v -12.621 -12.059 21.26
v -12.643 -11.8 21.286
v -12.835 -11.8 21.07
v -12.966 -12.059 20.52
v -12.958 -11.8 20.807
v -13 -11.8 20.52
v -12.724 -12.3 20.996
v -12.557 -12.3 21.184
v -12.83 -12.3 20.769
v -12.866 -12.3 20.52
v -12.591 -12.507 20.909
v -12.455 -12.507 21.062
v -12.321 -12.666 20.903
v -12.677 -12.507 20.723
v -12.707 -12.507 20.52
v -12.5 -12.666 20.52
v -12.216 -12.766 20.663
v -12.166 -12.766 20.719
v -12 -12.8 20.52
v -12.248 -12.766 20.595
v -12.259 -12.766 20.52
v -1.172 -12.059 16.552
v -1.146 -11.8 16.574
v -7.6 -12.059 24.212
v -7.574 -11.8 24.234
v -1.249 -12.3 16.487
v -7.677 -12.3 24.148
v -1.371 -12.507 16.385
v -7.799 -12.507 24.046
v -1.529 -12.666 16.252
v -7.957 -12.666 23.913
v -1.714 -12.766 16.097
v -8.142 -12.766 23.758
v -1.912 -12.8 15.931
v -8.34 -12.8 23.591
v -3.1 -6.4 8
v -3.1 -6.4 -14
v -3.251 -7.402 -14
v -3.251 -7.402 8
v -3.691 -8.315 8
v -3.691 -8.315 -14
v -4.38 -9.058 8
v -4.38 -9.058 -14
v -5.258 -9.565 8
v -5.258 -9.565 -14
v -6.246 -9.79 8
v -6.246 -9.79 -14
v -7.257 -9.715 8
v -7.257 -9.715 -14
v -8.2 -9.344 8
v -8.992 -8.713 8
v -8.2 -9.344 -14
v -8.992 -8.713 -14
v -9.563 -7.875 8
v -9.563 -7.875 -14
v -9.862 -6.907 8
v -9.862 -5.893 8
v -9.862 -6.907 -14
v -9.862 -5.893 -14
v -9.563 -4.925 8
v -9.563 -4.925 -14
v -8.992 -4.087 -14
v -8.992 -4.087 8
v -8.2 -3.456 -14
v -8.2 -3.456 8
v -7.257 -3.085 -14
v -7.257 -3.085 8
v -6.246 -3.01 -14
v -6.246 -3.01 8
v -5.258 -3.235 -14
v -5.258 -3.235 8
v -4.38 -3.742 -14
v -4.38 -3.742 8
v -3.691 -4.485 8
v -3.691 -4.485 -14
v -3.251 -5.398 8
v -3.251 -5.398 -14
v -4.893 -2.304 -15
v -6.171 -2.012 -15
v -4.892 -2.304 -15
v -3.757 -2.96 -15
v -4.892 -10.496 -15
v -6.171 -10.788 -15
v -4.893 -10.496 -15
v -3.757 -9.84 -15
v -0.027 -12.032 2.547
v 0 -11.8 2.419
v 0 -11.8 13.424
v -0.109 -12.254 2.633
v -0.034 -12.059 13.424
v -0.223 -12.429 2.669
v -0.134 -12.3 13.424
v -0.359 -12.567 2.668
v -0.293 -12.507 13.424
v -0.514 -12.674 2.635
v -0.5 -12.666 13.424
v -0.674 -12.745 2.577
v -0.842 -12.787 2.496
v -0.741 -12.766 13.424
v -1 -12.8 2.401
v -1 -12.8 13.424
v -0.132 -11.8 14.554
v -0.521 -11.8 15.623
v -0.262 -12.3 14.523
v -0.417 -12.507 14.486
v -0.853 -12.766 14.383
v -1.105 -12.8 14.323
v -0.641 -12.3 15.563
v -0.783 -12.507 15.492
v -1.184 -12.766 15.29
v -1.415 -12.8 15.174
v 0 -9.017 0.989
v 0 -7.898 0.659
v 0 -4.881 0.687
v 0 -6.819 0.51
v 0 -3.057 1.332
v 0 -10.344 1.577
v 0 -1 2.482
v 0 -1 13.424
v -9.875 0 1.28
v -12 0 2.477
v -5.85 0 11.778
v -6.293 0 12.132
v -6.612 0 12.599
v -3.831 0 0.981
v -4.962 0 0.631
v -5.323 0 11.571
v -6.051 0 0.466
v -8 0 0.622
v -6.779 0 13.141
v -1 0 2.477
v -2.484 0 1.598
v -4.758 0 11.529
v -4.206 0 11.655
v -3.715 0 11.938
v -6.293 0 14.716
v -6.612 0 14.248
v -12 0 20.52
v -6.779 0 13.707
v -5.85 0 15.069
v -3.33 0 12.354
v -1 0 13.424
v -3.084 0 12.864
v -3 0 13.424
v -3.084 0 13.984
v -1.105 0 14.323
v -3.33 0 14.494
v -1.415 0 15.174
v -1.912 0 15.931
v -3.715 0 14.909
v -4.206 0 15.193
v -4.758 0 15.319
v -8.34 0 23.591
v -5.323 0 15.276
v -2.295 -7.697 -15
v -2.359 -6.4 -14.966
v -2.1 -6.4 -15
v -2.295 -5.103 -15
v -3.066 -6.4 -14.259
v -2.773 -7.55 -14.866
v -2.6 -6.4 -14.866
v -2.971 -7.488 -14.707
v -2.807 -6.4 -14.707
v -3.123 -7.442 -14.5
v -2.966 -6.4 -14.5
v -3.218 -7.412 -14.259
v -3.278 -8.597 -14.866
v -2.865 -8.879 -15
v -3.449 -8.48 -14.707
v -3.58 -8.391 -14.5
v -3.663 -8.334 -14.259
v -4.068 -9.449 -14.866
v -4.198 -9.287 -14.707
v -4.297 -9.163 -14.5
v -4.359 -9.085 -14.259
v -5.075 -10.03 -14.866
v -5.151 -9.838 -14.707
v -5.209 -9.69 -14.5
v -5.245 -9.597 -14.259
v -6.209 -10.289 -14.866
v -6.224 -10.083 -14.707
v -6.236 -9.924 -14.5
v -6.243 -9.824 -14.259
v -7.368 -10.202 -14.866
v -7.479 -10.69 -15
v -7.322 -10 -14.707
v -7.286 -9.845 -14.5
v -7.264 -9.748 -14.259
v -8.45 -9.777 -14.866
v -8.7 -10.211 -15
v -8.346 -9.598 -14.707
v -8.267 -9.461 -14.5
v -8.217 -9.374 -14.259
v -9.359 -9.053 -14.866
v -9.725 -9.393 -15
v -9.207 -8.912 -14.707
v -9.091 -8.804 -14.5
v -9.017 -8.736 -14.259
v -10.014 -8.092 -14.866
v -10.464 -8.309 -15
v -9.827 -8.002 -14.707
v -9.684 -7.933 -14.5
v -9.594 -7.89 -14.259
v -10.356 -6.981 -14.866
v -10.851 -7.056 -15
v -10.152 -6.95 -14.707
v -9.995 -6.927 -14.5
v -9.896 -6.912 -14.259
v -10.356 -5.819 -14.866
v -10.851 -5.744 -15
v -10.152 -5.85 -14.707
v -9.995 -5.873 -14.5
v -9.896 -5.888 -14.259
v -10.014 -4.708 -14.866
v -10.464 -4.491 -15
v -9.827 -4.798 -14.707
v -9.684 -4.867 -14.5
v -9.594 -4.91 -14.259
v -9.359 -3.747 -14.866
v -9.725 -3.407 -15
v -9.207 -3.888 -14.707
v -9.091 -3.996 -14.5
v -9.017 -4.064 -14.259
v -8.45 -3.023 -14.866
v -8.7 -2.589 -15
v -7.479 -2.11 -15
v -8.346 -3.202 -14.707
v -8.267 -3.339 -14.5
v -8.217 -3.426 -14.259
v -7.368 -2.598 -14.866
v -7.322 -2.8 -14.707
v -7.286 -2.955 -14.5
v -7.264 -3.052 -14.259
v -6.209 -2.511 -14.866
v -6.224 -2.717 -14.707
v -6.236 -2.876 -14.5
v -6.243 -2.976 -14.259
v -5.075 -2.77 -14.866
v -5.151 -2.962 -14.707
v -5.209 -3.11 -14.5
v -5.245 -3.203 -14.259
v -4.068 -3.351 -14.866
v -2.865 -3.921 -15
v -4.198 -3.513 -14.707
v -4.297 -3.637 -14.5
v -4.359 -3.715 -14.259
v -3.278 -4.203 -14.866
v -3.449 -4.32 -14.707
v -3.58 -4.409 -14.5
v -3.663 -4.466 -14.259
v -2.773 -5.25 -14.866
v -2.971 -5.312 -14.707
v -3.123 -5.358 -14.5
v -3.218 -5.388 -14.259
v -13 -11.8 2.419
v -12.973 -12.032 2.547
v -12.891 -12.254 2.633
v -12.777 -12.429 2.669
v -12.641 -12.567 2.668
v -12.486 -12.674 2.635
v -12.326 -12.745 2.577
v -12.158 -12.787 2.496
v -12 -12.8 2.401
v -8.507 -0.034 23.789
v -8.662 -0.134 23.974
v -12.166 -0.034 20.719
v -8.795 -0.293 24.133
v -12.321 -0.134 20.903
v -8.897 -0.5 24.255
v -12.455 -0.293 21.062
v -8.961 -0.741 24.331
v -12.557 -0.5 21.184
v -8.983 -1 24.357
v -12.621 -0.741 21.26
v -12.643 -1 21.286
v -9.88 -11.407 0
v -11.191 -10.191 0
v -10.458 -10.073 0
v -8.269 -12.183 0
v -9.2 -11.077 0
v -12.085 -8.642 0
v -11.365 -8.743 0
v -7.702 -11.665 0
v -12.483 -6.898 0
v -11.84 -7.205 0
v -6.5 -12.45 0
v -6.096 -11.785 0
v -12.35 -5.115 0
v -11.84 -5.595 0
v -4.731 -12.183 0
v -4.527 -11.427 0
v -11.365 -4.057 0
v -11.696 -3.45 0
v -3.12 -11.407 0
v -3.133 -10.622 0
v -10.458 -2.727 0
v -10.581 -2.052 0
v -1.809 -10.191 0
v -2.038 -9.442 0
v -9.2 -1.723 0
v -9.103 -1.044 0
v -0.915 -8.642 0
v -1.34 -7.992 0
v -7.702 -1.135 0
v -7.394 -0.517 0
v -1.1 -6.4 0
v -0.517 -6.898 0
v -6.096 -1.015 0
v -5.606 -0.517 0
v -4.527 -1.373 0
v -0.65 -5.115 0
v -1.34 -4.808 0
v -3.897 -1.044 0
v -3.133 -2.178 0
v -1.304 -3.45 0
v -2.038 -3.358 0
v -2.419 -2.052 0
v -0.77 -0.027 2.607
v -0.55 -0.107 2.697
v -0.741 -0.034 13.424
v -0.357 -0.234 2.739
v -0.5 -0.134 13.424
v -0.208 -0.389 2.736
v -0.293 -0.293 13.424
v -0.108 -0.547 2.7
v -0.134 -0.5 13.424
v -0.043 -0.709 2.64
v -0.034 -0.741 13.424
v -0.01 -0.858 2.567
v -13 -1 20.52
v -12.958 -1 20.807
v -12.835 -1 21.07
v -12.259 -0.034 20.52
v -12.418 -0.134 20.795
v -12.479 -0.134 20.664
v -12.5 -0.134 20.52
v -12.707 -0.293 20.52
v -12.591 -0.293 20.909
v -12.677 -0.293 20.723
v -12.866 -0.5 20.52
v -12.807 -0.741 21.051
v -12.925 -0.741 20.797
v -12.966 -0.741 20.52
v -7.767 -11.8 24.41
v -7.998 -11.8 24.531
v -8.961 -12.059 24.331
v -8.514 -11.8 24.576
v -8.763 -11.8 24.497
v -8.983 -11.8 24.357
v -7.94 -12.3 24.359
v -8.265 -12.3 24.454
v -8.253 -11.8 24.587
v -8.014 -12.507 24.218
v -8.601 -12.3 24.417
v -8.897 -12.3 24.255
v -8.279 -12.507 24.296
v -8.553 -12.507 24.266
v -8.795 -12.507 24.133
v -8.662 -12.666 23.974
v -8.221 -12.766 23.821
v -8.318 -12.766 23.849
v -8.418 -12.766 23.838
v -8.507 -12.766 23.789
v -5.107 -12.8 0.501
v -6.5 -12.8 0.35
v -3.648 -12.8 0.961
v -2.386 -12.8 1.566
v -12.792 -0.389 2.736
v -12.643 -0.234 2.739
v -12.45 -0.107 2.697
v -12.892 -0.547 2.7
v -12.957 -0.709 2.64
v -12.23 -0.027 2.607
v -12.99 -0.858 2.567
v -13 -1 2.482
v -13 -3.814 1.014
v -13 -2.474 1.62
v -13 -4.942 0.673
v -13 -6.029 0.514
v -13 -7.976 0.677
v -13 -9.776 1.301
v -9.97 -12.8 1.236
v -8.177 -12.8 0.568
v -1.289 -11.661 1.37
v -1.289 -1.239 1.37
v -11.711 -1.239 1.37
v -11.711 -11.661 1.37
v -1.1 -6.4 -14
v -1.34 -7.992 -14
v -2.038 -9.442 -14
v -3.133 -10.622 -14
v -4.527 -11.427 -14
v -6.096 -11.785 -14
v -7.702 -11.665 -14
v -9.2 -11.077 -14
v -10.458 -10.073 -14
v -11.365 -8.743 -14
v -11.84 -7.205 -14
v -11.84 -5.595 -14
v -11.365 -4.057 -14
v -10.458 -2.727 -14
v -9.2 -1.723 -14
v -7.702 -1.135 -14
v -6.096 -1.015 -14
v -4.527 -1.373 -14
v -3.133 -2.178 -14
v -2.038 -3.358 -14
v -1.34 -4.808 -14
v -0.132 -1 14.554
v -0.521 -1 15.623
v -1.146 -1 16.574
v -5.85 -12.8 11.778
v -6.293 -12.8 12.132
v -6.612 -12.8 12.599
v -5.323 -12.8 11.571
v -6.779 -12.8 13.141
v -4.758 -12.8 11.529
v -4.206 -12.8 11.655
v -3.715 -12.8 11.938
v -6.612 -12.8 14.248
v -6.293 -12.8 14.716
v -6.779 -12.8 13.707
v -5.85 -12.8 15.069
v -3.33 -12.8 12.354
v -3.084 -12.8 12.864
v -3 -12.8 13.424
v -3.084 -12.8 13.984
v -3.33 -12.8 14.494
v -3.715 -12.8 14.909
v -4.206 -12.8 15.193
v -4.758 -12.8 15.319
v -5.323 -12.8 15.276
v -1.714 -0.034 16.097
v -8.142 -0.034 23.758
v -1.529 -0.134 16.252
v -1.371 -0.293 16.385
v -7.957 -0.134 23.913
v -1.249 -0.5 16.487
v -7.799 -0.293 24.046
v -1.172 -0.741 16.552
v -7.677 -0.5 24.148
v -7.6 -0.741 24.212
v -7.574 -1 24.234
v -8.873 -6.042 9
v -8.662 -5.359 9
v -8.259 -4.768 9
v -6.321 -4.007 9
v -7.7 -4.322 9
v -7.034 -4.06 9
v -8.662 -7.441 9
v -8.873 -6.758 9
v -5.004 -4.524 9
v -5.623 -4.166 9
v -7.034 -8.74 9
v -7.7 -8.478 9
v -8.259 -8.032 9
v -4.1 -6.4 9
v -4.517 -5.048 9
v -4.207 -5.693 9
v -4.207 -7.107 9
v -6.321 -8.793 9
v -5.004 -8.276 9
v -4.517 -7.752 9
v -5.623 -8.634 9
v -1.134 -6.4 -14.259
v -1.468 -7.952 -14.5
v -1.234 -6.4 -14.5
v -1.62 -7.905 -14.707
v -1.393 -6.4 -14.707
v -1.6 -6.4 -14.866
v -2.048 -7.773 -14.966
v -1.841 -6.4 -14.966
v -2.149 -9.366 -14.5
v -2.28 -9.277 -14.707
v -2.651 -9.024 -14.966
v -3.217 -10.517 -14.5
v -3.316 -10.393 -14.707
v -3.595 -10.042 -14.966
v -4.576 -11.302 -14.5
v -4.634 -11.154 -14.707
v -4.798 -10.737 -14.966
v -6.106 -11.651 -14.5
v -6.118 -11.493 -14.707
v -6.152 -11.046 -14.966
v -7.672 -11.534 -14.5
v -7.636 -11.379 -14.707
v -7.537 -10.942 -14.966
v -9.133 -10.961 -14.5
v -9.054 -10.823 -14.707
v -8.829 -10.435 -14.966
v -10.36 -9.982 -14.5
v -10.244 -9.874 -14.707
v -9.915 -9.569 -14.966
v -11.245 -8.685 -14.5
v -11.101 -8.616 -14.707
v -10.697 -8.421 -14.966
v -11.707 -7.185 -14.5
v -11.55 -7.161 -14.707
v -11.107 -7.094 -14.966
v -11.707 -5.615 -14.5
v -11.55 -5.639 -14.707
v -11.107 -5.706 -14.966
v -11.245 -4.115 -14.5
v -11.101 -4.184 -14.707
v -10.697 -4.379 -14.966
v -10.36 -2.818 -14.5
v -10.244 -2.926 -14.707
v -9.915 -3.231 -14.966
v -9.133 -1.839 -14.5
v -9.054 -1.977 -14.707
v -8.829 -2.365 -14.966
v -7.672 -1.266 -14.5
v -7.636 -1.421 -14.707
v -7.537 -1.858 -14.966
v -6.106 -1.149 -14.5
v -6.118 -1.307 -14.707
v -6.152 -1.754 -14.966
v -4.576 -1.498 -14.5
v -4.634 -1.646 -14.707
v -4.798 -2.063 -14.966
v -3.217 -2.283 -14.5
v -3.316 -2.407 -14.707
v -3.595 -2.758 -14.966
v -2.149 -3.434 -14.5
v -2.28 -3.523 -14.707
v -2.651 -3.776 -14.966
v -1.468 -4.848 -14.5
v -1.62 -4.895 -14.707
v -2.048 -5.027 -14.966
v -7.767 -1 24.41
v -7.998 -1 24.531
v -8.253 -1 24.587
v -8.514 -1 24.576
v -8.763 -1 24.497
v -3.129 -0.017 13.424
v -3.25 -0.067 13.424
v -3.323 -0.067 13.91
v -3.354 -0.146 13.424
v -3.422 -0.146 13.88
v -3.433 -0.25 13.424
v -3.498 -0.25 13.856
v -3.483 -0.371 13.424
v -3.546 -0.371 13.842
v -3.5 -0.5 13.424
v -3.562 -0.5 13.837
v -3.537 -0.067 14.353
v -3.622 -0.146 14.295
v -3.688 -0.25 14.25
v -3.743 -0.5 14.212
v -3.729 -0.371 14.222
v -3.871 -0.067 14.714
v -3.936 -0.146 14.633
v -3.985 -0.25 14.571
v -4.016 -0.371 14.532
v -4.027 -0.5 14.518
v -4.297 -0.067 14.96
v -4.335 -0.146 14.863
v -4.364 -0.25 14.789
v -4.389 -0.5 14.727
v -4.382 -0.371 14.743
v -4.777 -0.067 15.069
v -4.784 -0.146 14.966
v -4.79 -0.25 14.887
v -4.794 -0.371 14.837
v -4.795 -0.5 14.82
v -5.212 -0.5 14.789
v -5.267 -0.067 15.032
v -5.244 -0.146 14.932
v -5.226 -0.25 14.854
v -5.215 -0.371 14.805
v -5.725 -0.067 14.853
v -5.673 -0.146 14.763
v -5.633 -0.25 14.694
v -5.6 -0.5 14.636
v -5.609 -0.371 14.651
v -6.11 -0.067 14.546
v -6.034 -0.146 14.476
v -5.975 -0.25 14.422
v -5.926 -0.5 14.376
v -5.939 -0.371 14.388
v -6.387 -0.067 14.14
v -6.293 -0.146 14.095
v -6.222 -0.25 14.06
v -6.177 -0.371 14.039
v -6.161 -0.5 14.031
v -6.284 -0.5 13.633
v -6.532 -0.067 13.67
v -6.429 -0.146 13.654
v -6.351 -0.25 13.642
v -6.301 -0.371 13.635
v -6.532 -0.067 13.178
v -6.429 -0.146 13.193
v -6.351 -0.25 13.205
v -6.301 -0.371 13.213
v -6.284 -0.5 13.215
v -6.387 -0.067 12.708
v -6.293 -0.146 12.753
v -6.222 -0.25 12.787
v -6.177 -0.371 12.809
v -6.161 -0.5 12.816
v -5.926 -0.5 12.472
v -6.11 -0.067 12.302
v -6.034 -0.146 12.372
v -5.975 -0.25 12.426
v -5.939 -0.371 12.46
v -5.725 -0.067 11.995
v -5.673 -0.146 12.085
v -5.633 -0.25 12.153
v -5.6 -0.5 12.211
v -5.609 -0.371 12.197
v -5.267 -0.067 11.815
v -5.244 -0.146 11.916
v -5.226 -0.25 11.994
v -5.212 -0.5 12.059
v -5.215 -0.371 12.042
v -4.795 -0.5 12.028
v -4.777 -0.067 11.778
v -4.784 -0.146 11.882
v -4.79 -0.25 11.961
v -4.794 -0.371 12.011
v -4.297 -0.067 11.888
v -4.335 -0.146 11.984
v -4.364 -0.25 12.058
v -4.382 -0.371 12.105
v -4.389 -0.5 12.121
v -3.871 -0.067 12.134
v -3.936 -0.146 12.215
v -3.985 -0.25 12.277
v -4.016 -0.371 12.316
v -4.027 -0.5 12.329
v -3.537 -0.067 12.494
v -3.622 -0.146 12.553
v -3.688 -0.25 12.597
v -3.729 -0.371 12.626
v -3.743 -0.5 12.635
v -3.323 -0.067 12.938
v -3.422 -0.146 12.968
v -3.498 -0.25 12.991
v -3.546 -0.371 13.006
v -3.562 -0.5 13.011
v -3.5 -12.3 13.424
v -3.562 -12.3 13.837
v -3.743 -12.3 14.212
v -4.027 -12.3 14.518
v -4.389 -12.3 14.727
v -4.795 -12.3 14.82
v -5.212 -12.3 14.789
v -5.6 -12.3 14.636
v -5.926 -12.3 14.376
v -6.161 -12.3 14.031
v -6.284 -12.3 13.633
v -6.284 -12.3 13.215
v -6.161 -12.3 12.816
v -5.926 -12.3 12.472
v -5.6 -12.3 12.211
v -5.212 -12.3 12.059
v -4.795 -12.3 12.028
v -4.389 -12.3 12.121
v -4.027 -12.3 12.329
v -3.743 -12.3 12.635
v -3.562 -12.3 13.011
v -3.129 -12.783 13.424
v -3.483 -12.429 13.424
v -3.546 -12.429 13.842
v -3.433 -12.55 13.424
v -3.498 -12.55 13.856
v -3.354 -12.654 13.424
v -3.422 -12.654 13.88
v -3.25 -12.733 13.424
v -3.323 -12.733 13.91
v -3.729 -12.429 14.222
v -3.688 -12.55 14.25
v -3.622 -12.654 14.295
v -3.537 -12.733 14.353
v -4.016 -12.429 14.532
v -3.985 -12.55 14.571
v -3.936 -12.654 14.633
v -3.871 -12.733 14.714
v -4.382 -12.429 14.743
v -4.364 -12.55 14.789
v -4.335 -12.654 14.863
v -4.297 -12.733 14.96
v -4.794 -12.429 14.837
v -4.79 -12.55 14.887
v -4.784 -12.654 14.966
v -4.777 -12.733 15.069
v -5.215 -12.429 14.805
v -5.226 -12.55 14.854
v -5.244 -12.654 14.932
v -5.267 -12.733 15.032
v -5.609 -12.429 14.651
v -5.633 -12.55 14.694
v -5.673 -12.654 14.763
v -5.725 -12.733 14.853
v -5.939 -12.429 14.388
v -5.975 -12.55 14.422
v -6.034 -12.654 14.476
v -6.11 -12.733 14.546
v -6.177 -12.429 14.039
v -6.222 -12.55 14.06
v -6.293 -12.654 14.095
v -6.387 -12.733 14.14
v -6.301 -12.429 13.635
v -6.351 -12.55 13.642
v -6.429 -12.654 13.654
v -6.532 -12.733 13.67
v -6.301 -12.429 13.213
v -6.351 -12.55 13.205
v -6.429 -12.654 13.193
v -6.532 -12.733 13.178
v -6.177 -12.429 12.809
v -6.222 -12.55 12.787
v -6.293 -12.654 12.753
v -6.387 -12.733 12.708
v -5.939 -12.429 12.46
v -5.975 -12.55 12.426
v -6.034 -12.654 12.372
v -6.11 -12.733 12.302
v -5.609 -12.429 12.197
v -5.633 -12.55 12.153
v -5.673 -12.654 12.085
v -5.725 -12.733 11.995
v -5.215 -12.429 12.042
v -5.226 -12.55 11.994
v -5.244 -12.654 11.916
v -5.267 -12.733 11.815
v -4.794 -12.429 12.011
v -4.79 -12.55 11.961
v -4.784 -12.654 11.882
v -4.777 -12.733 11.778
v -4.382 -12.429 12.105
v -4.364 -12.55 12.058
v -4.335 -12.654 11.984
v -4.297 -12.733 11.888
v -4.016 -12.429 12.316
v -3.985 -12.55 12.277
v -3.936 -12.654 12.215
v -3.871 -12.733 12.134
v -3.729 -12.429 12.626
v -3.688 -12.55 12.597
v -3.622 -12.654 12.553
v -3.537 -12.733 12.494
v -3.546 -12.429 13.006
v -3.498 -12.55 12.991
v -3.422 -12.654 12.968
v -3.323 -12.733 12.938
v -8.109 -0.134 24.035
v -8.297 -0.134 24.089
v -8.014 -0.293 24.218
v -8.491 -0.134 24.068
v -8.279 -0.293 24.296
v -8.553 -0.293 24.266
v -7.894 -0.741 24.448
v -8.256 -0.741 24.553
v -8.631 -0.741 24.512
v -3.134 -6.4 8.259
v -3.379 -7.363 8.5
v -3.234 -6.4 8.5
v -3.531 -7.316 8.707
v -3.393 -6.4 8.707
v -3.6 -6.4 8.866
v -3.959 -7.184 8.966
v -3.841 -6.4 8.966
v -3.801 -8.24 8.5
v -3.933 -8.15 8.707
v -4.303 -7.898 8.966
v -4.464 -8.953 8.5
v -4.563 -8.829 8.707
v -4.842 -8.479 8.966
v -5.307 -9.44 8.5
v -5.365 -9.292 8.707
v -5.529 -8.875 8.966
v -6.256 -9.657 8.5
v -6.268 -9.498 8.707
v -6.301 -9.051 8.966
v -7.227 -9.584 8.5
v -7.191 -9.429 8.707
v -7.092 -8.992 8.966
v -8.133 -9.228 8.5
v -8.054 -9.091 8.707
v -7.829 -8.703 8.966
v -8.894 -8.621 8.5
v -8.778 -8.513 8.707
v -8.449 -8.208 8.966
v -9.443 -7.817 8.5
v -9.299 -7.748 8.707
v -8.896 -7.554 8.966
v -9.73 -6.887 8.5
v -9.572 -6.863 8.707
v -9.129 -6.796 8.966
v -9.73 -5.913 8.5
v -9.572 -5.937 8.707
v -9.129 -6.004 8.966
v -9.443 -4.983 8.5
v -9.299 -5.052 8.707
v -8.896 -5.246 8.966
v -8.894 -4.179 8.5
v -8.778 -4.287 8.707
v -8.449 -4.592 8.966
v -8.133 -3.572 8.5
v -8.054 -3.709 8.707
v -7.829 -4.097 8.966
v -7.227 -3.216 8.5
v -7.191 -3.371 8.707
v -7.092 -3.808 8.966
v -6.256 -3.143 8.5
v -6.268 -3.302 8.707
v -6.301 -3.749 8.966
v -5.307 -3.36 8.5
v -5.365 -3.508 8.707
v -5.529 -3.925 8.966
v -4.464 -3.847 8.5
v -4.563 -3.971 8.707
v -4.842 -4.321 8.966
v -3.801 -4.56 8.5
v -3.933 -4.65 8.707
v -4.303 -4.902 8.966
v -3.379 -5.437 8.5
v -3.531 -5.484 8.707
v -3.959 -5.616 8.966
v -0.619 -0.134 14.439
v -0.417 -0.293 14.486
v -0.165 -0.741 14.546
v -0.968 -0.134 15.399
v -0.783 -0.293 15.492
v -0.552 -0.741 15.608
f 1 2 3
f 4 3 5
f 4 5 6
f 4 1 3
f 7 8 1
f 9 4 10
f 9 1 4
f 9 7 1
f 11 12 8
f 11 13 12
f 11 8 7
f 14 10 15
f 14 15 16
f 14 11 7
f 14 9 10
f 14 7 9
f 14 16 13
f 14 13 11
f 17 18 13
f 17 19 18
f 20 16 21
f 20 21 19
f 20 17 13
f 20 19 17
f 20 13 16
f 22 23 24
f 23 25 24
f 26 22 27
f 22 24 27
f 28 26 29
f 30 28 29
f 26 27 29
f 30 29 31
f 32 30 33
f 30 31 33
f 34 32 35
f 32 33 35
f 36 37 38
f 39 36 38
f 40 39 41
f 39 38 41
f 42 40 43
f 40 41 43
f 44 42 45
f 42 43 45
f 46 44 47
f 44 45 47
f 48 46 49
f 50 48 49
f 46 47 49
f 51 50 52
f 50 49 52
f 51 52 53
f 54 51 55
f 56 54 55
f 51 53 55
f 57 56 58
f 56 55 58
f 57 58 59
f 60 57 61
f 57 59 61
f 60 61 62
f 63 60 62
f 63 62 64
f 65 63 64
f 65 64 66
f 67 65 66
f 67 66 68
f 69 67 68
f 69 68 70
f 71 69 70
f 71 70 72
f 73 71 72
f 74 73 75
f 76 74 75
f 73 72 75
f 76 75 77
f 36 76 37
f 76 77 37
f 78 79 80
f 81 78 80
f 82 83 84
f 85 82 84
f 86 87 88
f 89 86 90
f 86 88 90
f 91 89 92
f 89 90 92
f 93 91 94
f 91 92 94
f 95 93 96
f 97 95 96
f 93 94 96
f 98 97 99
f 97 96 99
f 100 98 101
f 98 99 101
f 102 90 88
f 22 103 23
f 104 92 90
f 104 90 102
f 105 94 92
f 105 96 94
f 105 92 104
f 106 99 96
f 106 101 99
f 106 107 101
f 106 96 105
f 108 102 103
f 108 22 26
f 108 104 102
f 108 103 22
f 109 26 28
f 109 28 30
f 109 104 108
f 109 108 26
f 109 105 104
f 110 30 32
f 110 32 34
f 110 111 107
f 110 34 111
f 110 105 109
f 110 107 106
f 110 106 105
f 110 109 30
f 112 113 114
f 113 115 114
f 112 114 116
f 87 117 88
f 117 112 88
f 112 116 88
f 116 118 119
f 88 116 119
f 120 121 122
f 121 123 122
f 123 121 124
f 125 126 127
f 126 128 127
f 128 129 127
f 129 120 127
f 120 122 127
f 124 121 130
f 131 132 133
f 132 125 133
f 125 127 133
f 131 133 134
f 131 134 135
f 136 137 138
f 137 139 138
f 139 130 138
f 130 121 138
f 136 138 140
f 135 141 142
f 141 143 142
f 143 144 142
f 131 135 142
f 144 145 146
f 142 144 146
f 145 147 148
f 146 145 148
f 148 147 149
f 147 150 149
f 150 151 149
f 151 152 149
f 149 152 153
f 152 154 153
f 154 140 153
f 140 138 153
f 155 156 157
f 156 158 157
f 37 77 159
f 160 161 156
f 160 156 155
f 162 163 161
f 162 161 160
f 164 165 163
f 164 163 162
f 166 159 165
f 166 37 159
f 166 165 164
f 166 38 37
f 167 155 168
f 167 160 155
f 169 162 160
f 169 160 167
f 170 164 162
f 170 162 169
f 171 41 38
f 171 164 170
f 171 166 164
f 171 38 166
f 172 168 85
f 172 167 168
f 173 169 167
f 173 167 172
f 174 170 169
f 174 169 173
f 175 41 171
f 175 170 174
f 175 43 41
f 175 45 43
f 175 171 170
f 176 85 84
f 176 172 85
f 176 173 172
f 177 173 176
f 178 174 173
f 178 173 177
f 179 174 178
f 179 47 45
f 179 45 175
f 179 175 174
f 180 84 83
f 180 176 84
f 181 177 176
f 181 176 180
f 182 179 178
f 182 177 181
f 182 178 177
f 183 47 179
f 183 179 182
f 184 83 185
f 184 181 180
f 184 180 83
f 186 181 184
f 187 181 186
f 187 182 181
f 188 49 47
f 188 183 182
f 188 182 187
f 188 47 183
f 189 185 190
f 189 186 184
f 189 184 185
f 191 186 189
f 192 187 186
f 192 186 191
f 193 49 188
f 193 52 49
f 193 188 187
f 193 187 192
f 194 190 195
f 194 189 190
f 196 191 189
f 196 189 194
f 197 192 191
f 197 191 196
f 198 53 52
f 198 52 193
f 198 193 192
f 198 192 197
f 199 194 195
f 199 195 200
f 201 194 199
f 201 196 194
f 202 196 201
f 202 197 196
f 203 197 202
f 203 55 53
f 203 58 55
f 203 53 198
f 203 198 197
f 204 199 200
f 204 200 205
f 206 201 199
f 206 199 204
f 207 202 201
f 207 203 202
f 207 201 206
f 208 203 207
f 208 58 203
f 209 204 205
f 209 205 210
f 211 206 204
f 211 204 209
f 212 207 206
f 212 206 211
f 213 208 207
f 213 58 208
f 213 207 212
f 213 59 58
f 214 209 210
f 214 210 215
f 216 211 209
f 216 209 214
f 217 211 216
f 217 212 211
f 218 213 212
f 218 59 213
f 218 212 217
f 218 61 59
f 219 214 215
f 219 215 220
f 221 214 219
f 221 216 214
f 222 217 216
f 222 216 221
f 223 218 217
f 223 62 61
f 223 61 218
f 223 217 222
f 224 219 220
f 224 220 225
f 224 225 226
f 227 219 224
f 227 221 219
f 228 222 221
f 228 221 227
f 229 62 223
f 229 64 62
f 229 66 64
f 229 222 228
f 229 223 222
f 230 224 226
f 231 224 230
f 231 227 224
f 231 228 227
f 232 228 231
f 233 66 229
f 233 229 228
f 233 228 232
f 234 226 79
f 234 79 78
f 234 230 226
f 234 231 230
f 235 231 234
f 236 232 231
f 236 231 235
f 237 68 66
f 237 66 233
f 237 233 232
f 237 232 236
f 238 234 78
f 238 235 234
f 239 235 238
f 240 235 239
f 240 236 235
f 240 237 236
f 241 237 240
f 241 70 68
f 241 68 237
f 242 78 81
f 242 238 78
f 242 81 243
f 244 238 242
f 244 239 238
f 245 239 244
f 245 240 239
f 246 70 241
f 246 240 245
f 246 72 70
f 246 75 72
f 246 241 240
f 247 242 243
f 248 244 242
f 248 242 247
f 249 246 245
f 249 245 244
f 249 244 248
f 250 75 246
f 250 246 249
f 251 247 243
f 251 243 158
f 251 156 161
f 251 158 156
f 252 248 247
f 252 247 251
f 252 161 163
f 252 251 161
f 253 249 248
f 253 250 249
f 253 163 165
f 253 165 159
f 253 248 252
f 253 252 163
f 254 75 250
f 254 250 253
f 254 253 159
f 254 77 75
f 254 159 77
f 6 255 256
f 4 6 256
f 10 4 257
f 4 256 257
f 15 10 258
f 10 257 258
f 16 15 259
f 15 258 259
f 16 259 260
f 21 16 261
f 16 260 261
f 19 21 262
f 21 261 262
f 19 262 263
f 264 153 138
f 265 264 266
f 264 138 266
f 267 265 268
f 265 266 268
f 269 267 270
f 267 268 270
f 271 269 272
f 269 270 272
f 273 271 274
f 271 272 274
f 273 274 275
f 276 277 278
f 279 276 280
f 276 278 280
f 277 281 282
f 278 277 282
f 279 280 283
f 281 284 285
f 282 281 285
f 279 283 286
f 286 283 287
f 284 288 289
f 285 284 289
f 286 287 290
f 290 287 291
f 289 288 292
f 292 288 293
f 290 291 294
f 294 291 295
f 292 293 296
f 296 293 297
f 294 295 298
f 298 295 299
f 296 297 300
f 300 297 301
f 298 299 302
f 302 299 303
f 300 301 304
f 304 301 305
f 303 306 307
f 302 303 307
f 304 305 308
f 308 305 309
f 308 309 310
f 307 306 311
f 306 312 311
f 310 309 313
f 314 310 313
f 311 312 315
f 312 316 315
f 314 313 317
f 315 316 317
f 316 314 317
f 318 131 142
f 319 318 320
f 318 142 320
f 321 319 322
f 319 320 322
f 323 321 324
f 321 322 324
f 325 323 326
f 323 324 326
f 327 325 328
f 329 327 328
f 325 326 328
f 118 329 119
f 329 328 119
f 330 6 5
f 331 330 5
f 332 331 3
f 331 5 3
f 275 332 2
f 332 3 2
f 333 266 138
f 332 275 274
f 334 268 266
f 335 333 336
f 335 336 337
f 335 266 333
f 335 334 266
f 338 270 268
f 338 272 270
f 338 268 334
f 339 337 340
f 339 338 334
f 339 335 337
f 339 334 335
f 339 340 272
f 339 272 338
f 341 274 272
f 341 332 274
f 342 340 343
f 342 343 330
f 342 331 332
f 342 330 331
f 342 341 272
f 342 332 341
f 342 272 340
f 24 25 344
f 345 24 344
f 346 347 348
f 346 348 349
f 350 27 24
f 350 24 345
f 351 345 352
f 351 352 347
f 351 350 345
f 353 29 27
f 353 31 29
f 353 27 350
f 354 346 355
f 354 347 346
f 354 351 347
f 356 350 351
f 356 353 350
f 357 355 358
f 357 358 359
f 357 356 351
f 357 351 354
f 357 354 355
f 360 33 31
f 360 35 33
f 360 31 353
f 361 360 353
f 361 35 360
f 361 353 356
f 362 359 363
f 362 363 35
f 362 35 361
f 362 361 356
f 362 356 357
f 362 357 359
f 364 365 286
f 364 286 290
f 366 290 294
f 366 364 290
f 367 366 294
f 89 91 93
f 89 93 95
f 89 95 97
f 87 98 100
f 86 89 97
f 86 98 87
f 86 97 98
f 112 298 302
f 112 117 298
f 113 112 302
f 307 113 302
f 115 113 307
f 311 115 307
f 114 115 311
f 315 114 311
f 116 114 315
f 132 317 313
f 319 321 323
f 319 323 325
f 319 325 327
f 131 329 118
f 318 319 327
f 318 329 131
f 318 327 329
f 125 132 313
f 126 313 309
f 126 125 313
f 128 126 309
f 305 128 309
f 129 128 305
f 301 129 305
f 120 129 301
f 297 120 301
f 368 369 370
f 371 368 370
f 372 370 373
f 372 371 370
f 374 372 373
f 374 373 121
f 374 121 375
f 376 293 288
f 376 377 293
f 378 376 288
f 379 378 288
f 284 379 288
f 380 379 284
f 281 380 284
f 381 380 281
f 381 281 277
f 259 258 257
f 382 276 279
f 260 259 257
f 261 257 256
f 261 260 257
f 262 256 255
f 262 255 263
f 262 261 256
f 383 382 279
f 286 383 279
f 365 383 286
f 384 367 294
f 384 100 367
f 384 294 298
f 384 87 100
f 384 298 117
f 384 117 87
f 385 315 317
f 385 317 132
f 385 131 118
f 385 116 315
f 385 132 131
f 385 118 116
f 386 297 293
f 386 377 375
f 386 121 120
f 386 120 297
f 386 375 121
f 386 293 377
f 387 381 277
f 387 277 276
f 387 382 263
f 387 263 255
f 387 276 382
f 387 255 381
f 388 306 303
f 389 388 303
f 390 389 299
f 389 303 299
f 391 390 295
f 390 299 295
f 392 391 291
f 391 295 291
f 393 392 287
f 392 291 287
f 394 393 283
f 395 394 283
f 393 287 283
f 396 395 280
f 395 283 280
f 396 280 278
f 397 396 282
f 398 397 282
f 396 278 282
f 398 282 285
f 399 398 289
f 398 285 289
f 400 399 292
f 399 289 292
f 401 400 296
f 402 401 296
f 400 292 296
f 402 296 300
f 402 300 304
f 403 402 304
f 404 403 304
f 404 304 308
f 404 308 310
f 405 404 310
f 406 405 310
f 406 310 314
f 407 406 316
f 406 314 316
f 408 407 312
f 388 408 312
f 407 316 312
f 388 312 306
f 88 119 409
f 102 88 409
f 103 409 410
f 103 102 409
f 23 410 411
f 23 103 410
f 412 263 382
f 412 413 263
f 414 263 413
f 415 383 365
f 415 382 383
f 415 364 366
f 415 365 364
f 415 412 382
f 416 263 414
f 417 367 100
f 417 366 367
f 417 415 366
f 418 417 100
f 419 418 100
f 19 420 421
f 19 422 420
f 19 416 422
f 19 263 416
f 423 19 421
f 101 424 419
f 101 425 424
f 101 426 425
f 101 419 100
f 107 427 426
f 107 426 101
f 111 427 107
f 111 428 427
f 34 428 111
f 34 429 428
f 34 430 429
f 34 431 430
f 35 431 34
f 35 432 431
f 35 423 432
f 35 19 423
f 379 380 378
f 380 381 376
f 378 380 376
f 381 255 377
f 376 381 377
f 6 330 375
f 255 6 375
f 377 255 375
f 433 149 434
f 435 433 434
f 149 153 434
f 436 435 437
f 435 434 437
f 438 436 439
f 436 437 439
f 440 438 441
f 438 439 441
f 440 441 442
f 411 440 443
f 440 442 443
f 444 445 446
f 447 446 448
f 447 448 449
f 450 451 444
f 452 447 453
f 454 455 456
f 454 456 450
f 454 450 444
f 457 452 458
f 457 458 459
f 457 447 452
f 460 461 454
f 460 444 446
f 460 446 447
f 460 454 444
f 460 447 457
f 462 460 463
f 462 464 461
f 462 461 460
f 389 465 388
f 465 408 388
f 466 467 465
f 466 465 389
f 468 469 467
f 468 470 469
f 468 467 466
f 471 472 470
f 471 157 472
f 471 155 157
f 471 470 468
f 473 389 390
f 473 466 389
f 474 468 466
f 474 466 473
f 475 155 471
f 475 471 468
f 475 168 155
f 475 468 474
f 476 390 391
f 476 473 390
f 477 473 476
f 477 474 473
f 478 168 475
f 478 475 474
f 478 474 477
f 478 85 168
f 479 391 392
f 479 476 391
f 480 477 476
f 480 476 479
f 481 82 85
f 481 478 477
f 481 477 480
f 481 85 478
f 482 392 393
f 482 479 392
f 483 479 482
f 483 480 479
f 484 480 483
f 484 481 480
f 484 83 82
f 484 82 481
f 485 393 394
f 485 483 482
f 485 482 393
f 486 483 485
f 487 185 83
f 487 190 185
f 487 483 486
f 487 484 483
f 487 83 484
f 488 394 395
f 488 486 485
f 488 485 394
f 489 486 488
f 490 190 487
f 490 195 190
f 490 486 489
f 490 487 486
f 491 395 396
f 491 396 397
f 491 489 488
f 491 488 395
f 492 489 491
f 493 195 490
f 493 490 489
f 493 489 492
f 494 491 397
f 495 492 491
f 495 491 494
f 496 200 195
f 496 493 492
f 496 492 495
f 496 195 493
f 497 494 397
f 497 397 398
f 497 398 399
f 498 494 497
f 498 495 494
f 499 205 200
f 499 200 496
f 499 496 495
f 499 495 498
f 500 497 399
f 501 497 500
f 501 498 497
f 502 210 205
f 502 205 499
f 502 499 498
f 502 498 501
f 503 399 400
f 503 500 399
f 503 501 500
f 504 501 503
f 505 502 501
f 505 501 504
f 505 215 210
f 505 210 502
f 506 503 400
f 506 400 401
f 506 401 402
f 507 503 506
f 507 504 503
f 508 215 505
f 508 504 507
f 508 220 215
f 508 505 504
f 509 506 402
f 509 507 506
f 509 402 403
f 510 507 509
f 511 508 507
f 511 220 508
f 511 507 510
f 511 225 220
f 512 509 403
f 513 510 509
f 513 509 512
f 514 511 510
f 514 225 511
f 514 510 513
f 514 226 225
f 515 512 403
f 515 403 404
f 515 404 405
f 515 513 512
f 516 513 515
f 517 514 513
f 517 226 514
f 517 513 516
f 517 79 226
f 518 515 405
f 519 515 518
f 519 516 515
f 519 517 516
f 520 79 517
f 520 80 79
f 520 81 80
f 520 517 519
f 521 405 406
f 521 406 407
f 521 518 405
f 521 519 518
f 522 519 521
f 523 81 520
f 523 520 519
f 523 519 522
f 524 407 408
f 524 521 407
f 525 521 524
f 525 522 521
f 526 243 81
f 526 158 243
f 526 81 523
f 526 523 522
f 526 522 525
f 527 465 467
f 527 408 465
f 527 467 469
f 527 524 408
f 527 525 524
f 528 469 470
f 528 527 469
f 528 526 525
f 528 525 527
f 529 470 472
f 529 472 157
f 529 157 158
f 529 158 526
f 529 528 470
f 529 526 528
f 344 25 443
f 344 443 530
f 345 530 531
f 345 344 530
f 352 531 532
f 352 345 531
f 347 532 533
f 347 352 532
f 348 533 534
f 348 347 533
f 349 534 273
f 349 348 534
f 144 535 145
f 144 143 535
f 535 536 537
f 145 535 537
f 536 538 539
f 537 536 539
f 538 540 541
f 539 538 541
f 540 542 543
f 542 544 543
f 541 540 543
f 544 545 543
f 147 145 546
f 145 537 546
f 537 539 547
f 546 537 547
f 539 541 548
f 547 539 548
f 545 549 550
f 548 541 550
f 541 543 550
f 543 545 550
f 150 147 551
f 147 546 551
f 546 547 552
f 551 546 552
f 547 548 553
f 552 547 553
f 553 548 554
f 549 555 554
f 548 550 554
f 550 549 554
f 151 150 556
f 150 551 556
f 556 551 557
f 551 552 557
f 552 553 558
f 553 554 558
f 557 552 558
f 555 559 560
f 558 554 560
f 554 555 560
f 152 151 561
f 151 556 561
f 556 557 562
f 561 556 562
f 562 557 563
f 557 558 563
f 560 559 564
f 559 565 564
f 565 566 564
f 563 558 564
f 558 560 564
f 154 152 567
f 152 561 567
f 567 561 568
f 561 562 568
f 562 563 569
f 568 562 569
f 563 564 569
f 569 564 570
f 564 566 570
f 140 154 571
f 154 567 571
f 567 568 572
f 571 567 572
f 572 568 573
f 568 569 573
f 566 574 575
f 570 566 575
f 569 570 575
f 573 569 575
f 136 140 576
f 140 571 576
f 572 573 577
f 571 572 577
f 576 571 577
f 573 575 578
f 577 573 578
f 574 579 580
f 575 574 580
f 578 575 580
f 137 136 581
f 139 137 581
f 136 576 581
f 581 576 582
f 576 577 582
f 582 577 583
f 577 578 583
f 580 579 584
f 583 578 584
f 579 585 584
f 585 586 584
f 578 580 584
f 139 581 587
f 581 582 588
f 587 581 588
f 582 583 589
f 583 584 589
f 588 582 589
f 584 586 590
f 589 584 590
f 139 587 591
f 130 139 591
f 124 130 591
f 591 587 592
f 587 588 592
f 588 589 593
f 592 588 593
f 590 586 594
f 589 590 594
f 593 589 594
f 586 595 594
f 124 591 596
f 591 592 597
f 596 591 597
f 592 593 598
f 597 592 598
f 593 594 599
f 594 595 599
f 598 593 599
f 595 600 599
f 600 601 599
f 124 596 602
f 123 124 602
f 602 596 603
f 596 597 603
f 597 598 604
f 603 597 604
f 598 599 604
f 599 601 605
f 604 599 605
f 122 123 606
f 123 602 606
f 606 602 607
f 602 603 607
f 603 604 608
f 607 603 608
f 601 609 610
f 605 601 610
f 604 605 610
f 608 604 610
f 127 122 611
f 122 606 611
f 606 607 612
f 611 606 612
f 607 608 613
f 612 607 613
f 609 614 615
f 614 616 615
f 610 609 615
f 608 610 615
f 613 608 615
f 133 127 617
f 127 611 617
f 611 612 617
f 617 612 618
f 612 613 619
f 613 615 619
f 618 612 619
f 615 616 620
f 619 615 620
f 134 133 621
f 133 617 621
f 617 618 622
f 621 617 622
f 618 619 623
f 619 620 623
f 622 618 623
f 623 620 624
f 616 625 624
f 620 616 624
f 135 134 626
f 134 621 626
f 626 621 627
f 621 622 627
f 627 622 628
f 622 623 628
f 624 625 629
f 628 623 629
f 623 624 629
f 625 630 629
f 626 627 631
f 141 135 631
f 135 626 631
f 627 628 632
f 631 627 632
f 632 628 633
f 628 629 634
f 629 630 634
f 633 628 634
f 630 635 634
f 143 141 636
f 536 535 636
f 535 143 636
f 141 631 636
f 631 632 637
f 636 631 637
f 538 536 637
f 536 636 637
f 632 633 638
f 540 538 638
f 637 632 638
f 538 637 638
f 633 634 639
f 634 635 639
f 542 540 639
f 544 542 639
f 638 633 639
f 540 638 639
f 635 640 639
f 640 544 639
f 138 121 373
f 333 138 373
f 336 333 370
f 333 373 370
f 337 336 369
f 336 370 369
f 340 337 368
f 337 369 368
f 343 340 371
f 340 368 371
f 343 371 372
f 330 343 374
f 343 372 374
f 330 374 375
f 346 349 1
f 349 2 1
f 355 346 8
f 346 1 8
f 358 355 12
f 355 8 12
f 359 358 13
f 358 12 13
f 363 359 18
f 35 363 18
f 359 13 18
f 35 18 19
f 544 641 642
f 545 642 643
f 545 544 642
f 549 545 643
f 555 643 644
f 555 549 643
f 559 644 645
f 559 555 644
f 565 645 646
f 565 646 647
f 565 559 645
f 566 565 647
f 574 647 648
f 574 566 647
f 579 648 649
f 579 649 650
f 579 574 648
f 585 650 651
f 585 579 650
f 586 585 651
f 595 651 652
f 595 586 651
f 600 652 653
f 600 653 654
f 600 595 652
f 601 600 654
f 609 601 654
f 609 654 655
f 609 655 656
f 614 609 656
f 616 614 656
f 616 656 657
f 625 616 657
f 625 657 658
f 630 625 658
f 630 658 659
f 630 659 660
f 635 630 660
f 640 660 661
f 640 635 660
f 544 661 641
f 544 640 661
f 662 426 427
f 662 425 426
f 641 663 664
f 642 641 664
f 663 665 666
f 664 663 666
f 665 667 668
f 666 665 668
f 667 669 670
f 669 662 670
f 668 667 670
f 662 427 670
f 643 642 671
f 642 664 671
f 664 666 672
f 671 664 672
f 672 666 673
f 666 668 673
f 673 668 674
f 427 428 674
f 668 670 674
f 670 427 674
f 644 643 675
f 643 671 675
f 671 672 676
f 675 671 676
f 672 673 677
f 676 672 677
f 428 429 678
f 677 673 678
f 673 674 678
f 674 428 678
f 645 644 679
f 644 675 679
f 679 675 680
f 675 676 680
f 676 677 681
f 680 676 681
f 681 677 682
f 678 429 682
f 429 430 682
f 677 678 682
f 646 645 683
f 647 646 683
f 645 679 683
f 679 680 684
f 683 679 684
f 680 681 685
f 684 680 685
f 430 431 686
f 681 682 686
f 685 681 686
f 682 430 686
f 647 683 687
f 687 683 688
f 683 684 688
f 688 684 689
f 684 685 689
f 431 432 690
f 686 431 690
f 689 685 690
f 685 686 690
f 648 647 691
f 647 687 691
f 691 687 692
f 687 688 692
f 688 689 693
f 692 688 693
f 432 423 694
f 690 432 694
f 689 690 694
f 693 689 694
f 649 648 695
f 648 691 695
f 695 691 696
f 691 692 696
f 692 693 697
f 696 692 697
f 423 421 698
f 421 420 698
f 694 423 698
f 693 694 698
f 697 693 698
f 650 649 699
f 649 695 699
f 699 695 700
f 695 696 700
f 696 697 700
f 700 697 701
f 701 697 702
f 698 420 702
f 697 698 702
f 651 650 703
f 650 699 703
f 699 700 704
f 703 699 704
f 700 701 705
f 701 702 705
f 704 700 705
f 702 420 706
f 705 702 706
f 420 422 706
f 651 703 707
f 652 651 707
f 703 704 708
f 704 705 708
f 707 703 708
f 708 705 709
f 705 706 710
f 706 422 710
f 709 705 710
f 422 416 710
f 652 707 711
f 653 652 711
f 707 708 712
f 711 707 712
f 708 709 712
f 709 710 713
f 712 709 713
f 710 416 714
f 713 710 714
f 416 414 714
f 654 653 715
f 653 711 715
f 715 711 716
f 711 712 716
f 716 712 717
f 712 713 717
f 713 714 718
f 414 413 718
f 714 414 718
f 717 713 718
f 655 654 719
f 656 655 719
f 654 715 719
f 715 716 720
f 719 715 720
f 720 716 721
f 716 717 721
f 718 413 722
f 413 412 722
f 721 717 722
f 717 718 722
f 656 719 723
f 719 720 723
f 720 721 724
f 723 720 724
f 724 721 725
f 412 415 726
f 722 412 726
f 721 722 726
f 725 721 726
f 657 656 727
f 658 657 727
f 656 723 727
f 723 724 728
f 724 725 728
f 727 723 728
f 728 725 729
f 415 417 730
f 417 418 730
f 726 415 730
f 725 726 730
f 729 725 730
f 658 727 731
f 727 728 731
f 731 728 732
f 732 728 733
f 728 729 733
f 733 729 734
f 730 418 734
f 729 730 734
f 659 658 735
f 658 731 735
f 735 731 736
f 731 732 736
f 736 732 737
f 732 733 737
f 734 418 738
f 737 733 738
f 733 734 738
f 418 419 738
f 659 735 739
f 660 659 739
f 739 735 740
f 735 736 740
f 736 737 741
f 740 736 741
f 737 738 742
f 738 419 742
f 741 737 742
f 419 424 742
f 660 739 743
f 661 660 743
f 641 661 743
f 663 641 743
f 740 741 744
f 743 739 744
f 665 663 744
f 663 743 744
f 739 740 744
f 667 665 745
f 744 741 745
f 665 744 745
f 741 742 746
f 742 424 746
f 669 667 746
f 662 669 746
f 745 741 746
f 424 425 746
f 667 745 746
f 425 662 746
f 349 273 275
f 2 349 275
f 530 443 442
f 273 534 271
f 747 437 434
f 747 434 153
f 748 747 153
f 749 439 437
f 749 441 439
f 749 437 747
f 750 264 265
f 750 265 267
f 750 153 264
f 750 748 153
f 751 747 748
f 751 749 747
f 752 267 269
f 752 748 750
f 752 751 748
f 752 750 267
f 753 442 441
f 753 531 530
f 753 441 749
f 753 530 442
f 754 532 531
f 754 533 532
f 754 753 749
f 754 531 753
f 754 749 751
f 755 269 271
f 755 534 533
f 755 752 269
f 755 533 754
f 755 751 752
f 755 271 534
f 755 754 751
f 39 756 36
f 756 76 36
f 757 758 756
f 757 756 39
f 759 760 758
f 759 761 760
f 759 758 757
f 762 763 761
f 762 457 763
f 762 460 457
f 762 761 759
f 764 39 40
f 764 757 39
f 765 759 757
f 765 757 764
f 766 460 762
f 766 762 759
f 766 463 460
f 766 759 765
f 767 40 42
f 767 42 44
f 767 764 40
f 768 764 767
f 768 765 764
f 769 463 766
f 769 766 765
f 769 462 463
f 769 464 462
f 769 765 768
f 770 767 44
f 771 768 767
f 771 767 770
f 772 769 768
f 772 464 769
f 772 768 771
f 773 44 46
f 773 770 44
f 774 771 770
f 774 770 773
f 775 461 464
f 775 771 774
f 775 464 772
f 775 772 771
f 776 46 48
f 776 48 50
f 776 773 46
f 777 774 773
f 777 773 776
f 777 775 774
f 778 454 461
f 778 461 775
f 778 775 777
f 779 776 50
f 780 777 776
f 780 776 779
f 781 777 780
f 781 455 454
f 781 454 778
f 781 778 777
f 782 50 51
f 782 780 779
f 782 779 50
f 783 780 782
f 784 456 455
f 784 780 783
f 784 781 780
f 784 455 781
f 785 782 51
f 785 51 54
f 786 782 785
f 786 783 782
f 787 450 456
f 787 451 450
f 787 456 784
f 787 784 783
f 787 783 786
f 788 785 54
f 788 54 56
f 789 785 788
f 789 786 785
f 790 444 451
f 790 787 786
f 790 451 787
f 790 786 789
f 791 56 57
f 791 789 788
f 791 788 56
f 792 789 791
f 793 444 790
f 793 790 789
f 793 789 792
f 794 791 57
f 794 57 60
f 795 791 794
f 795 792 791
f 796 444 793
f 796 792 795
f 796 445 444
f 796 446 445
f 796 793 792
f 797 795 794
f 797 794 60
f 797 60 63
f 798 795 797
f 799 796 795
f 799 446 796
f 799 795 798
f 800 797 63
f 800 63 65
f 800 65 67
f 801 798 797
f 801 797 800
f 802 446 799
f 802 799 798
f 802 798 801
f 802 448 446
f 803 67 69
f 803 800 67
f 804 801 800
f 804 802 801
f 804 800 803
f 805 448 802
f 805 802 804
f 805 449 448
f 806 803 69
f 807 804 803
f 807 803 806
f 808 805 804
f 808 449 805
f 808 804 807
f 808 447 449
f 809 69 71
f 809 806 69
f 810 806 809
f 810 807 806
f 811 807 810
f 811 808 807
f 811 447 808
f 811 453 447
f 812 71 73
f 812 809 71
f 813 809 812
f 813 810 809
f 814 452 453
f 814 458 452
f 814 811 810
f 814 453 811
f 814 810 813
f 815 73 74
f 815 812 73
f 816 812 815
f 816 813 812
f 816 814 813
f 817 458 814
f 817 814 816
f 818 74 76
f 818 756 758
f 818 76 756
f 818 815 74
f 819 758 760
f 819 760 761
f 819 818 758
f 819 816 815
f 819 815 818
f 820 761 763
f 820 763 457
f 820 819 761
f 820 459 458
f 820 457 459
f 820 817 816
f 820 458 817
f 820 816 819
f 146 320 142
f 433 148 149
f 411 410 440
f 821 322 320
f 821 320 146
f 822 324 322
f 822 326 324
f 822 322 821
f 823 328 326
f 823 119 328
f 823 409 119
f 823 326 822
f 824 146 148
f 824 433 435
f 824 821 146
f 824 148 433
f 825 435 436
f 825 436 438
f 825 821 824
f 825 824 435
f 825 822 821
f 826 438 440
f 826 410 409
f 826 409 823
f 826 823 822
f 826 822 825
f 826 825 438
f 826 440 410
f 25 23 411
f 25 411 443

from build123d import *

# Parameters (mm, degrees)
F0_R      = 1.4
F1_DEPTH  = 12.8
F2_R      = 4.9
F3_R      = 1
F4_R      = 5.4
F5_DEPTH  = 15
F9_R      = 3.4
F10_DEPTH = 24
F11_R     = 0.99999
F12_R     = 0.5


# Not quite as in the source:
# - a fillet or chamfer is up to 0.001 mm smaller than in the source, because OpenCascade refuses the exact size


with BuildPart() as f1:
    # F0 (on Front) → F1 (new body)
    with BuildSketch(Plane.XZ):
        Polygon((-13, 0), (0, 0), (0, 15.2073059861), (-8.2170459353, 25), (-13, 20.9866250083), align=None)
        with Locations((-4.9, 13.4238518382)):
            Circle(F0_R, mode=Mode.SUBTRACT)
    extrude(amount=F1_DEPTH)

    # F2
    f2_edges = [f1.edges().sort_by_distance(p)[0] for p in [
        (0, -6.4, 15.207306),
    ]]
    fillet(f2_edges, radius=F2_R)

    # F3
    f3_edges = [f1.edges().sort_by_distance(p)[0] for p in [
        (-8.217046, -6.4, 25),
        (-13, -6.4, 20.986625),
    ]]
    fillet(f3_edges, radius=F3_R)

    # F4 (on face) → F5 (join)
    with BuildSketch(Plane(origin=(0, 0, 0), x_dir=(1, 0, 0), z_dir=(0, 0, -1))):
        with Locations((-6.5, 6.4)):
            Circle(F4_R)
    extrude(amount=F5_DEPTH)

    # F7 (on offset) → F8 (revolve, cut)
    with BuildSketch(Plane.YZ.offset(-6.5)):
        Polygon((-17.45, 0), (-12.45, 0), (-17.45, 5), align=None)
    revolve(axis=Axis((-6.5, -6.45, -7.3510144139), (0, 0, 1)), mode=Mode.SUBTRACT)

    # F9 (on face) → F10 (cut)
    with BuildSketch(Plane(origin=(0, 0, -15), x_dir=(1, 0, 0), z_dir=(0, 0, -1))):
        with Locations((-6.5, 6.4)):
            Circle(F9_R)
    extrude(amount=-F10_DEPTH, mode=Mode.SUBTRACT)

    # F11 (radius 1 in the source; OpenCascade refuses exactly that, so slightly less here)
    f11_edges = [f1.edges().sort_by_distance(p)[0] for p in [
        (-11.9, -6.4, -15),
        (-9.9, -6.4, -15),
        (-13, 0, 11.838709),
        (0, -12.8, 8.255397),
        (-9.9, -6.4, 9),
    ]]
    fillet(f11_edges, radius=F11_R)

    # F12
    f12_edges = [f1.edges().sort_by_distance(p)[0] for p in [
        (-6.3, -12.8, 13.423852),
        (-6.3, 0, 13.423852),
    ]]
    fillet(f12_edges, radius=F12_R)


solid = f1.part
